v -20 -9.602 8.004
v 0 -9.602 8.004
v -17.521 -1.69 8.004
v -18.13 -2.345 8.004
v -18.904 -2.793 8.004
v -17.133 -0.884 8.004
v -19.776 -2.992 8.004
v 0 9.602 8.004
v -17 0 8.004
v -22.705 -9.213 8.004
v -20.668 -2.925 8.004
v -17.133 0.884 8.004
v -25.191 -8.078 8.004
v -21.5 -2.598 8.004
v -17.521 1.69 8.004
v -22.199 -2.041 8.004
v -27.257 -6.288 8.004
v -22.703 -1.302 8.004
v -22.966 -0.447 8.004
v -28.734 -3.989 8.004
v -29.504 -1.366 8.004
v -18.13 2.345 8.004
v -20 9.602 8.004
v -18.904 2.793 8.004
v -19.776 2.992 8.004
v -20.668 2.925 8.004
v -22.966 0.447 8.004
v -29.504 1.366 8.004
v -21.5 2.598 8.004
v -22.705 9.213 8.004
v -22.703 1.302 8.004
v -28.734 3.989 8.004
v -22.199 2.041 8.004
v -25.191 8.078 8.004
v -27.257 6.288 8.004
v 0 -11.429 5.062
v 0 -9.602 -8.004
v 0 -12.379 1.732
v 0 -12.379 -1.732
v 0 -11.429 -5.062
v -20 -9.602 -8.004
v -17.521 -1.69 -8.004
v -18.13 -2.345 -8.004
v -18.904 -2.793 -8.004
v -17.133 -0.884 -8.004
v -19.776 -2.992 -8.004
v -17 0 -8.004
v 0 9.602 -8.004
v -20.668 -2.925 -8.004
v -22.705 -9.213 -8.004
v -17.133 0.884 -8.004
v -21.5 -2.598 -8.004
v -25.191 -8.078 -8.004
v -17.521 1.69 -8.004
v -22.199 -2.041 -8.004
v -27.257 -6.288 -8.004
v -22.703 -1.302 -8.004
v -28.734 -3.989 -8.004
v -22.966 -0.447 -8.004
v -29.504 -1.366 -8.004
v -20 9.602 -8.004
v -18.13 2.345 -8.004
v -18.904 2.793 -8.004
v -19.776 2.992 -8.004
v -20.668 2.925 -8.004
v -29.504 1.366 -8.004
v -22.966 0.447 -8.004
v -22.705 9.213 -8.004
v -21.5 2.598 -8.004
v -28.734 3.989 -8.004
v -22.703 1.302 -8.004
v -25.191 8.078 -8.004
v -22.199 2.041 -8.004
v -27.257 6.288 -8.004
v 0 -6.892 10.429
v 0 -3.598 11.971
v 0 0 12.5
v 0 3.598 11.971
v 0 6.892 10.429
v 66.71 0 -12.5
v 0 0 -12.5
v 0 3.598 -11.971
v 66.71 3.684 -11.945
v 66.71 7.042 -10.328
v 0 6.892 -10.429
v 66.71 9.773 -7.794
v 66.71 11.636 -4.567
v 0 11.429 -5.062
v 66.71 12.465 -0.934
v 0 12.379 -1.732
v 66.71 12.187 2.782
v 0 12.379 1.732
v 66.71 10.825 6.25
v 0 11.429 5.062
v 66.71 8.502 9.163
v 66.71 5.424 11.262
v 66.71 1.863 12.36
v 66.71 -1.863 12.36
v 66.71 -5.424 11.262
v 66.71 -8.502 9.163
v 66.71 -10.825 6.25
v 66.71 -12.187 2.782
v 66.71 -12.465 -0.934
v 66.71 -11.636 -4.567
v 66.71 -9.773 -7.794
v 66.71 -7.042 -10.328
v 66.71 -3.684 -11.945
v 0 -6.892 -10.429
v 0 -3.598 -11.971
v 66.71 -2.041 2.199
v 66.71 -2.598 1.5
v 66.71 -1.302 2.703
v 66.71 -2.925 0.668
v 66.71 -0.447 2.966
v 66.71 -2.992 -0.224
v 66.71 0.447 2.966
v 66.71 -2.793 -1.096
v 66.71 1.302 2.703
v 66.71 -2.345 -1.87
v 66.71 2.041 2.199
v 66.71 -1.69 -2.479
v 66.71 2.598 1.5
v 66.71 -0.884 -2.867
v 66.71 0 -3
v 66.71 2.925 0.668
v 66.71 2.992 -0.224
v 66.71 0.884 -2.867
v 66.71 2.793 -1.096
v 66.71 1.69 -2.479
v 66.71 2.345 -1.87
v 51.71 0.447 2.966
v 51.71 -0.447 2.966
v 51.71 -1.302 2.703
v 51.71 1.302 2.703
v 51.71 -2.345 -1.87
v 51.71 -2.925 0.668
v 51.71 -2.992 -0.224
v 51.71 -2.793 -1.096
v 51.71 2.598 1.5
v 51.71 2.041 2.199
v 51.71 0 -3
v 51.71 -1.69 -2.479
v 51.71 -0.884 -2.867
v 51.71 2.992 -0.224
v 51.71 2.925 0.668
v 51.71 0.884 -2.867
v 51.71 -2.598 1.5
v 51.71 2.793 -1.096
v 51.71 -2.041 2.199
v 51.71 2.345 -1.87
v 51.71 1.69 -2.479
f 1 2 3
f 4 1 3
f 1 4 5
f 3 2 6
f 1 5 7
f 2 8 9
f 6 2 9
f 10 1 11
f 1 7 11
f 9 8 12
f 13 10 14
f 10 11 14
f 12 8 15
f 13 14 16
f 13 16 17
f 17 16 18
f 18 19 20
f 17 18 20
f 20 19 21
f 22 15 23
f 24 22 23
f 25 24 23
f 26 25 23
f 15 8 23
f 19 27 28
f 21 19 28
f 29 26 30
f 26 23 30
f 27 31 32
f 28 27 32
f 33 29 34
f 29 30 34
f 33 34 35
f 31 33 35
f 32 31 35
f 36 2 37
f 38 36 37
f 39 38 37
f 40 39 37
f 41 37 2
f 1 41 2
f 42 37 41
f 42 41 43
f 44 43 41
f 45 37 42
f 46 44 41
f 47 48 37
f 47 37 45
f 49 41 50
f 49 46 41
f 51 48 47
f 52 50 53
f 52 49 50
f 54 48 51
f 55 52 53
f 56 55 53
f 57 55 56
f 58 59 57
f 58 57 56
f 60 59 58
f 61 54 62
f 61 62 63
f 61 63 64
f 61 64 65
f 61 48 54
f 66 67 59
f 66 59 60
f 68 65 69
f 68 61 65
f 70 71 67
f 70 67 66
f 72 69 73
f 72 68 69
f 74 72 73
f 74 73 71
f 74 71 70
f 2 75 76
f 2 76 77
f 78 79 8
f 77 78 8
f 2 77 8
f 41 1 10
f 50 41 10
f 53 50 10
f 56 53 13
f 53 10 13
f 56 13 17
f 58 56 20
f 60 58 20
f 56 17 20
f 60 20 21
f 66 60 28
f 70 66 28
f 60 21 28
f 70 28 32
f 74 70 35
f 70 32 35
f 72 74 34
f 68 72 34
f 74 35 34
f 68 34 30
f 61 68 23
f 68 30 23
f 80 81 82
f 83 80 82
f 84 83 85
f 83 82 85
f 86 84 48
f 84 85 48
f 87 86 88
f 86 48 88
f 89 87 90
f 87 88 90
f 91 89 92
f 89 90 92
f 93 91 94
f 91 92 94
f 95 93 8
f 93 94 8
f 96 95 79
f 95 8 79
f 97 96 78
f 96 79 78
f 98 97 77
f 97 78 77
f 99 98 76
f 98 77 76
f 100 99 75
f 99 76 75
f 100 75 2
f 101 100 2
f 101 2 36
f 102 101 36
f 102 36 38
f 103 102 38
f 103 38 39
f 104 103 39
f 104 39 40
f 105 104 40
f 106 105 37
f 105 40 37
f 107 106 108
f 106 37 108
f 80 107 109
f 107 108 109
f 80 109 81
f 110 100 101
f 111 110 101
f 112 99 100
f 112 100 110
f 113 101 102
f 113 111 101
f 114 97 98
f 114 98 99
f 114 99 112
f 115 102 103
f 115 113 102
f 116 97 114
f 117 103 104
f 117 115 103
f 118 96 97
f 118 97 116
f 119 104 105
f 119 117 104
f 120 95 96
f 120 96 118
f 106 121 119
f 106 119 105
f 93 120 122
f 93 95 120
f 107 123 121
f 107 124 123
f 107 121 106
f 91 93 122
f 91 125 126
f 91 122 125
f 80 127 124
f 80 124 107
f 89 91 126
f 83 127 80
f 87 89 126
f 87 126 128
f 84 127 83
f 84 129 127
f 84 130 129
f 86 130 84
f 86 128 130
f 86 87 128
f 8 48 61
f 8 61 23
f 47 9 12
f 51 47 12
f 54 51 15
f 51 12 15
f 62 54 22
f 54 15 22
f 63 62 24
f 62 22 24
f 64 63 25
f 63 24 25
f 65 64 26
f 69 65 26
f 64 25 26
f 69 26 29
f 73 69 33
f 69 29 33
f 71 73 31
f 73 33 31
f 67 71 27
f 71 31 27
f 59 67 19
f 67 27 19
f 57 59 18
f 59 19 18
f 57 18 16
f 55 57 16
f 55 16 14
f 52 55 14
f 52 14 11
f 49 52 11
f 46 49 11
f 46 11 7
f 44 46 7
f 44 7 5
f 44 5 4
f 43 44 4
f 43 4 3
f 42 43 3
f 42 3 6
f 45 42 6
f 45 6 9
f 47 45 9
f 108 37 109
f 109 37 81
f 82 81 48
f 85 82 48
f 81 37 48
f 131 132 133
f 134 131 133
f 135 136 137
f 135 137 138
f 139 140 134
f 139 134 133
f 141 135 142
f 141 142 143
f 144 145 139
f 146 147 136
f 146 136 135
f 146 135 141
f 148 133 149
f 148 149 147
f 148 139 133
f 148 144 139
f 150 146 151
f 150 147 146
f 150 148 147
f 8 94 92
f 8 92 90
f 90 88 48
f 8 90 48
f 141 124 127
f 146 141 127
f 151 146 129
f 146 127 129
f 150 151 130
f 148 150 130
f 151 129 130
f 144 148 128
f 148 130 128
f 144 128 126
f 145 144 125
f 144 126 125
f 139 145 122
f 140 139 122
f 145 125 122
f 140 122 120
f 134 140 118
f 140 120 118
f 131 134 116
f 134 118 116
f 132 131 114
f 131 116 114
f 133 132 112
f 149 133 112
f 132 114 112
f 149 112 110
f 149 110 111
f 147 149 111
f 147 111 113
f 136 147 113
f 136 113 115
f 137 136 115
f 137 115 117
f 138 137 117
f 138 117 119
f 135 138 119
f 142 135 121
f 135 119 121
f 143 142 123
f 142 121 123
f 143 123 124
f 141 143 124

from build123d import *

# Parameters (mm, degrees)
SKETCH1_R           = 12.5
BOSS_EXTRUDE1_DEPTH = 66.71
SKETCH2_W           = 16.007
SKETCH2_H           = 19.203540064
BOSS_EXTRUDE2_DEPTH = 20
BOSS_EXTRUDE3_DEPTH = 16.007
SKETCH4_R           = 3
CUT_EXTRUDE1_DEPTH  = 71.900406291
SKETCH5_R           = 3
CUT_EXTRUDE2_DEPTH  = 15


with BuildPart() as part:
    # Sketch1 → Boss-Extrude1 (new body)
    with BuildSketch(Plane(origin=(0, 0, 0), x_dir=(0, 0, -1), z_dir=(1, 0, 0))):
        Circle(SKETCH1_R)
    extrude(amount=BOSS_EXTRUDE1_DEPTH)

    # Sketch2 → Boss-Extrude2 (add)
    with BuildSketch(Plane.ZY):
        Rectangle(SKETCH2_W, SKETCH2_H)
    extrude(amount=BOSS_EXTRUDE2_DEPTH)

    # Sketch3 → Boss-Extrude3 (add)
    with BuildSketch(Plane.XY.offset(8.0035)):
        with BuildLine():
            Line((-20, 9.601770032), (-20, -9.601770032))
            ThreePointArc((-20, -9.601770032), (-29.601770032, 0), (-20, 9.601770032))
        make_face()
    extrude(amount=-BOSS_EXTRUDE3_DEPTH)

    # Sketch4 → Cut-Extrude1 (cut, through all)
    with BuildSketch(Plane.XY.offset(8.0035)):
        with Locations((-20, 0)):
            Circle(SKETCH4_R)
    extrude(amount=-CUT_EXTRUDE1_DEPTH, mode=Mode.SUBTRACT)

    # Sketch5 → Cut-Extrude2 (cut)
    with BuildSketch(Plane(origin=(66.71, 0, 0), x_dir=(0, 0, -1), z_dir=(1, 0, 0))):
        Circle(SKETCH5_R)
    extrude(amount=-CUT_EXTRUDE2_DEPTH, mode=Mode.SUBTRACT)


solid = part.part
